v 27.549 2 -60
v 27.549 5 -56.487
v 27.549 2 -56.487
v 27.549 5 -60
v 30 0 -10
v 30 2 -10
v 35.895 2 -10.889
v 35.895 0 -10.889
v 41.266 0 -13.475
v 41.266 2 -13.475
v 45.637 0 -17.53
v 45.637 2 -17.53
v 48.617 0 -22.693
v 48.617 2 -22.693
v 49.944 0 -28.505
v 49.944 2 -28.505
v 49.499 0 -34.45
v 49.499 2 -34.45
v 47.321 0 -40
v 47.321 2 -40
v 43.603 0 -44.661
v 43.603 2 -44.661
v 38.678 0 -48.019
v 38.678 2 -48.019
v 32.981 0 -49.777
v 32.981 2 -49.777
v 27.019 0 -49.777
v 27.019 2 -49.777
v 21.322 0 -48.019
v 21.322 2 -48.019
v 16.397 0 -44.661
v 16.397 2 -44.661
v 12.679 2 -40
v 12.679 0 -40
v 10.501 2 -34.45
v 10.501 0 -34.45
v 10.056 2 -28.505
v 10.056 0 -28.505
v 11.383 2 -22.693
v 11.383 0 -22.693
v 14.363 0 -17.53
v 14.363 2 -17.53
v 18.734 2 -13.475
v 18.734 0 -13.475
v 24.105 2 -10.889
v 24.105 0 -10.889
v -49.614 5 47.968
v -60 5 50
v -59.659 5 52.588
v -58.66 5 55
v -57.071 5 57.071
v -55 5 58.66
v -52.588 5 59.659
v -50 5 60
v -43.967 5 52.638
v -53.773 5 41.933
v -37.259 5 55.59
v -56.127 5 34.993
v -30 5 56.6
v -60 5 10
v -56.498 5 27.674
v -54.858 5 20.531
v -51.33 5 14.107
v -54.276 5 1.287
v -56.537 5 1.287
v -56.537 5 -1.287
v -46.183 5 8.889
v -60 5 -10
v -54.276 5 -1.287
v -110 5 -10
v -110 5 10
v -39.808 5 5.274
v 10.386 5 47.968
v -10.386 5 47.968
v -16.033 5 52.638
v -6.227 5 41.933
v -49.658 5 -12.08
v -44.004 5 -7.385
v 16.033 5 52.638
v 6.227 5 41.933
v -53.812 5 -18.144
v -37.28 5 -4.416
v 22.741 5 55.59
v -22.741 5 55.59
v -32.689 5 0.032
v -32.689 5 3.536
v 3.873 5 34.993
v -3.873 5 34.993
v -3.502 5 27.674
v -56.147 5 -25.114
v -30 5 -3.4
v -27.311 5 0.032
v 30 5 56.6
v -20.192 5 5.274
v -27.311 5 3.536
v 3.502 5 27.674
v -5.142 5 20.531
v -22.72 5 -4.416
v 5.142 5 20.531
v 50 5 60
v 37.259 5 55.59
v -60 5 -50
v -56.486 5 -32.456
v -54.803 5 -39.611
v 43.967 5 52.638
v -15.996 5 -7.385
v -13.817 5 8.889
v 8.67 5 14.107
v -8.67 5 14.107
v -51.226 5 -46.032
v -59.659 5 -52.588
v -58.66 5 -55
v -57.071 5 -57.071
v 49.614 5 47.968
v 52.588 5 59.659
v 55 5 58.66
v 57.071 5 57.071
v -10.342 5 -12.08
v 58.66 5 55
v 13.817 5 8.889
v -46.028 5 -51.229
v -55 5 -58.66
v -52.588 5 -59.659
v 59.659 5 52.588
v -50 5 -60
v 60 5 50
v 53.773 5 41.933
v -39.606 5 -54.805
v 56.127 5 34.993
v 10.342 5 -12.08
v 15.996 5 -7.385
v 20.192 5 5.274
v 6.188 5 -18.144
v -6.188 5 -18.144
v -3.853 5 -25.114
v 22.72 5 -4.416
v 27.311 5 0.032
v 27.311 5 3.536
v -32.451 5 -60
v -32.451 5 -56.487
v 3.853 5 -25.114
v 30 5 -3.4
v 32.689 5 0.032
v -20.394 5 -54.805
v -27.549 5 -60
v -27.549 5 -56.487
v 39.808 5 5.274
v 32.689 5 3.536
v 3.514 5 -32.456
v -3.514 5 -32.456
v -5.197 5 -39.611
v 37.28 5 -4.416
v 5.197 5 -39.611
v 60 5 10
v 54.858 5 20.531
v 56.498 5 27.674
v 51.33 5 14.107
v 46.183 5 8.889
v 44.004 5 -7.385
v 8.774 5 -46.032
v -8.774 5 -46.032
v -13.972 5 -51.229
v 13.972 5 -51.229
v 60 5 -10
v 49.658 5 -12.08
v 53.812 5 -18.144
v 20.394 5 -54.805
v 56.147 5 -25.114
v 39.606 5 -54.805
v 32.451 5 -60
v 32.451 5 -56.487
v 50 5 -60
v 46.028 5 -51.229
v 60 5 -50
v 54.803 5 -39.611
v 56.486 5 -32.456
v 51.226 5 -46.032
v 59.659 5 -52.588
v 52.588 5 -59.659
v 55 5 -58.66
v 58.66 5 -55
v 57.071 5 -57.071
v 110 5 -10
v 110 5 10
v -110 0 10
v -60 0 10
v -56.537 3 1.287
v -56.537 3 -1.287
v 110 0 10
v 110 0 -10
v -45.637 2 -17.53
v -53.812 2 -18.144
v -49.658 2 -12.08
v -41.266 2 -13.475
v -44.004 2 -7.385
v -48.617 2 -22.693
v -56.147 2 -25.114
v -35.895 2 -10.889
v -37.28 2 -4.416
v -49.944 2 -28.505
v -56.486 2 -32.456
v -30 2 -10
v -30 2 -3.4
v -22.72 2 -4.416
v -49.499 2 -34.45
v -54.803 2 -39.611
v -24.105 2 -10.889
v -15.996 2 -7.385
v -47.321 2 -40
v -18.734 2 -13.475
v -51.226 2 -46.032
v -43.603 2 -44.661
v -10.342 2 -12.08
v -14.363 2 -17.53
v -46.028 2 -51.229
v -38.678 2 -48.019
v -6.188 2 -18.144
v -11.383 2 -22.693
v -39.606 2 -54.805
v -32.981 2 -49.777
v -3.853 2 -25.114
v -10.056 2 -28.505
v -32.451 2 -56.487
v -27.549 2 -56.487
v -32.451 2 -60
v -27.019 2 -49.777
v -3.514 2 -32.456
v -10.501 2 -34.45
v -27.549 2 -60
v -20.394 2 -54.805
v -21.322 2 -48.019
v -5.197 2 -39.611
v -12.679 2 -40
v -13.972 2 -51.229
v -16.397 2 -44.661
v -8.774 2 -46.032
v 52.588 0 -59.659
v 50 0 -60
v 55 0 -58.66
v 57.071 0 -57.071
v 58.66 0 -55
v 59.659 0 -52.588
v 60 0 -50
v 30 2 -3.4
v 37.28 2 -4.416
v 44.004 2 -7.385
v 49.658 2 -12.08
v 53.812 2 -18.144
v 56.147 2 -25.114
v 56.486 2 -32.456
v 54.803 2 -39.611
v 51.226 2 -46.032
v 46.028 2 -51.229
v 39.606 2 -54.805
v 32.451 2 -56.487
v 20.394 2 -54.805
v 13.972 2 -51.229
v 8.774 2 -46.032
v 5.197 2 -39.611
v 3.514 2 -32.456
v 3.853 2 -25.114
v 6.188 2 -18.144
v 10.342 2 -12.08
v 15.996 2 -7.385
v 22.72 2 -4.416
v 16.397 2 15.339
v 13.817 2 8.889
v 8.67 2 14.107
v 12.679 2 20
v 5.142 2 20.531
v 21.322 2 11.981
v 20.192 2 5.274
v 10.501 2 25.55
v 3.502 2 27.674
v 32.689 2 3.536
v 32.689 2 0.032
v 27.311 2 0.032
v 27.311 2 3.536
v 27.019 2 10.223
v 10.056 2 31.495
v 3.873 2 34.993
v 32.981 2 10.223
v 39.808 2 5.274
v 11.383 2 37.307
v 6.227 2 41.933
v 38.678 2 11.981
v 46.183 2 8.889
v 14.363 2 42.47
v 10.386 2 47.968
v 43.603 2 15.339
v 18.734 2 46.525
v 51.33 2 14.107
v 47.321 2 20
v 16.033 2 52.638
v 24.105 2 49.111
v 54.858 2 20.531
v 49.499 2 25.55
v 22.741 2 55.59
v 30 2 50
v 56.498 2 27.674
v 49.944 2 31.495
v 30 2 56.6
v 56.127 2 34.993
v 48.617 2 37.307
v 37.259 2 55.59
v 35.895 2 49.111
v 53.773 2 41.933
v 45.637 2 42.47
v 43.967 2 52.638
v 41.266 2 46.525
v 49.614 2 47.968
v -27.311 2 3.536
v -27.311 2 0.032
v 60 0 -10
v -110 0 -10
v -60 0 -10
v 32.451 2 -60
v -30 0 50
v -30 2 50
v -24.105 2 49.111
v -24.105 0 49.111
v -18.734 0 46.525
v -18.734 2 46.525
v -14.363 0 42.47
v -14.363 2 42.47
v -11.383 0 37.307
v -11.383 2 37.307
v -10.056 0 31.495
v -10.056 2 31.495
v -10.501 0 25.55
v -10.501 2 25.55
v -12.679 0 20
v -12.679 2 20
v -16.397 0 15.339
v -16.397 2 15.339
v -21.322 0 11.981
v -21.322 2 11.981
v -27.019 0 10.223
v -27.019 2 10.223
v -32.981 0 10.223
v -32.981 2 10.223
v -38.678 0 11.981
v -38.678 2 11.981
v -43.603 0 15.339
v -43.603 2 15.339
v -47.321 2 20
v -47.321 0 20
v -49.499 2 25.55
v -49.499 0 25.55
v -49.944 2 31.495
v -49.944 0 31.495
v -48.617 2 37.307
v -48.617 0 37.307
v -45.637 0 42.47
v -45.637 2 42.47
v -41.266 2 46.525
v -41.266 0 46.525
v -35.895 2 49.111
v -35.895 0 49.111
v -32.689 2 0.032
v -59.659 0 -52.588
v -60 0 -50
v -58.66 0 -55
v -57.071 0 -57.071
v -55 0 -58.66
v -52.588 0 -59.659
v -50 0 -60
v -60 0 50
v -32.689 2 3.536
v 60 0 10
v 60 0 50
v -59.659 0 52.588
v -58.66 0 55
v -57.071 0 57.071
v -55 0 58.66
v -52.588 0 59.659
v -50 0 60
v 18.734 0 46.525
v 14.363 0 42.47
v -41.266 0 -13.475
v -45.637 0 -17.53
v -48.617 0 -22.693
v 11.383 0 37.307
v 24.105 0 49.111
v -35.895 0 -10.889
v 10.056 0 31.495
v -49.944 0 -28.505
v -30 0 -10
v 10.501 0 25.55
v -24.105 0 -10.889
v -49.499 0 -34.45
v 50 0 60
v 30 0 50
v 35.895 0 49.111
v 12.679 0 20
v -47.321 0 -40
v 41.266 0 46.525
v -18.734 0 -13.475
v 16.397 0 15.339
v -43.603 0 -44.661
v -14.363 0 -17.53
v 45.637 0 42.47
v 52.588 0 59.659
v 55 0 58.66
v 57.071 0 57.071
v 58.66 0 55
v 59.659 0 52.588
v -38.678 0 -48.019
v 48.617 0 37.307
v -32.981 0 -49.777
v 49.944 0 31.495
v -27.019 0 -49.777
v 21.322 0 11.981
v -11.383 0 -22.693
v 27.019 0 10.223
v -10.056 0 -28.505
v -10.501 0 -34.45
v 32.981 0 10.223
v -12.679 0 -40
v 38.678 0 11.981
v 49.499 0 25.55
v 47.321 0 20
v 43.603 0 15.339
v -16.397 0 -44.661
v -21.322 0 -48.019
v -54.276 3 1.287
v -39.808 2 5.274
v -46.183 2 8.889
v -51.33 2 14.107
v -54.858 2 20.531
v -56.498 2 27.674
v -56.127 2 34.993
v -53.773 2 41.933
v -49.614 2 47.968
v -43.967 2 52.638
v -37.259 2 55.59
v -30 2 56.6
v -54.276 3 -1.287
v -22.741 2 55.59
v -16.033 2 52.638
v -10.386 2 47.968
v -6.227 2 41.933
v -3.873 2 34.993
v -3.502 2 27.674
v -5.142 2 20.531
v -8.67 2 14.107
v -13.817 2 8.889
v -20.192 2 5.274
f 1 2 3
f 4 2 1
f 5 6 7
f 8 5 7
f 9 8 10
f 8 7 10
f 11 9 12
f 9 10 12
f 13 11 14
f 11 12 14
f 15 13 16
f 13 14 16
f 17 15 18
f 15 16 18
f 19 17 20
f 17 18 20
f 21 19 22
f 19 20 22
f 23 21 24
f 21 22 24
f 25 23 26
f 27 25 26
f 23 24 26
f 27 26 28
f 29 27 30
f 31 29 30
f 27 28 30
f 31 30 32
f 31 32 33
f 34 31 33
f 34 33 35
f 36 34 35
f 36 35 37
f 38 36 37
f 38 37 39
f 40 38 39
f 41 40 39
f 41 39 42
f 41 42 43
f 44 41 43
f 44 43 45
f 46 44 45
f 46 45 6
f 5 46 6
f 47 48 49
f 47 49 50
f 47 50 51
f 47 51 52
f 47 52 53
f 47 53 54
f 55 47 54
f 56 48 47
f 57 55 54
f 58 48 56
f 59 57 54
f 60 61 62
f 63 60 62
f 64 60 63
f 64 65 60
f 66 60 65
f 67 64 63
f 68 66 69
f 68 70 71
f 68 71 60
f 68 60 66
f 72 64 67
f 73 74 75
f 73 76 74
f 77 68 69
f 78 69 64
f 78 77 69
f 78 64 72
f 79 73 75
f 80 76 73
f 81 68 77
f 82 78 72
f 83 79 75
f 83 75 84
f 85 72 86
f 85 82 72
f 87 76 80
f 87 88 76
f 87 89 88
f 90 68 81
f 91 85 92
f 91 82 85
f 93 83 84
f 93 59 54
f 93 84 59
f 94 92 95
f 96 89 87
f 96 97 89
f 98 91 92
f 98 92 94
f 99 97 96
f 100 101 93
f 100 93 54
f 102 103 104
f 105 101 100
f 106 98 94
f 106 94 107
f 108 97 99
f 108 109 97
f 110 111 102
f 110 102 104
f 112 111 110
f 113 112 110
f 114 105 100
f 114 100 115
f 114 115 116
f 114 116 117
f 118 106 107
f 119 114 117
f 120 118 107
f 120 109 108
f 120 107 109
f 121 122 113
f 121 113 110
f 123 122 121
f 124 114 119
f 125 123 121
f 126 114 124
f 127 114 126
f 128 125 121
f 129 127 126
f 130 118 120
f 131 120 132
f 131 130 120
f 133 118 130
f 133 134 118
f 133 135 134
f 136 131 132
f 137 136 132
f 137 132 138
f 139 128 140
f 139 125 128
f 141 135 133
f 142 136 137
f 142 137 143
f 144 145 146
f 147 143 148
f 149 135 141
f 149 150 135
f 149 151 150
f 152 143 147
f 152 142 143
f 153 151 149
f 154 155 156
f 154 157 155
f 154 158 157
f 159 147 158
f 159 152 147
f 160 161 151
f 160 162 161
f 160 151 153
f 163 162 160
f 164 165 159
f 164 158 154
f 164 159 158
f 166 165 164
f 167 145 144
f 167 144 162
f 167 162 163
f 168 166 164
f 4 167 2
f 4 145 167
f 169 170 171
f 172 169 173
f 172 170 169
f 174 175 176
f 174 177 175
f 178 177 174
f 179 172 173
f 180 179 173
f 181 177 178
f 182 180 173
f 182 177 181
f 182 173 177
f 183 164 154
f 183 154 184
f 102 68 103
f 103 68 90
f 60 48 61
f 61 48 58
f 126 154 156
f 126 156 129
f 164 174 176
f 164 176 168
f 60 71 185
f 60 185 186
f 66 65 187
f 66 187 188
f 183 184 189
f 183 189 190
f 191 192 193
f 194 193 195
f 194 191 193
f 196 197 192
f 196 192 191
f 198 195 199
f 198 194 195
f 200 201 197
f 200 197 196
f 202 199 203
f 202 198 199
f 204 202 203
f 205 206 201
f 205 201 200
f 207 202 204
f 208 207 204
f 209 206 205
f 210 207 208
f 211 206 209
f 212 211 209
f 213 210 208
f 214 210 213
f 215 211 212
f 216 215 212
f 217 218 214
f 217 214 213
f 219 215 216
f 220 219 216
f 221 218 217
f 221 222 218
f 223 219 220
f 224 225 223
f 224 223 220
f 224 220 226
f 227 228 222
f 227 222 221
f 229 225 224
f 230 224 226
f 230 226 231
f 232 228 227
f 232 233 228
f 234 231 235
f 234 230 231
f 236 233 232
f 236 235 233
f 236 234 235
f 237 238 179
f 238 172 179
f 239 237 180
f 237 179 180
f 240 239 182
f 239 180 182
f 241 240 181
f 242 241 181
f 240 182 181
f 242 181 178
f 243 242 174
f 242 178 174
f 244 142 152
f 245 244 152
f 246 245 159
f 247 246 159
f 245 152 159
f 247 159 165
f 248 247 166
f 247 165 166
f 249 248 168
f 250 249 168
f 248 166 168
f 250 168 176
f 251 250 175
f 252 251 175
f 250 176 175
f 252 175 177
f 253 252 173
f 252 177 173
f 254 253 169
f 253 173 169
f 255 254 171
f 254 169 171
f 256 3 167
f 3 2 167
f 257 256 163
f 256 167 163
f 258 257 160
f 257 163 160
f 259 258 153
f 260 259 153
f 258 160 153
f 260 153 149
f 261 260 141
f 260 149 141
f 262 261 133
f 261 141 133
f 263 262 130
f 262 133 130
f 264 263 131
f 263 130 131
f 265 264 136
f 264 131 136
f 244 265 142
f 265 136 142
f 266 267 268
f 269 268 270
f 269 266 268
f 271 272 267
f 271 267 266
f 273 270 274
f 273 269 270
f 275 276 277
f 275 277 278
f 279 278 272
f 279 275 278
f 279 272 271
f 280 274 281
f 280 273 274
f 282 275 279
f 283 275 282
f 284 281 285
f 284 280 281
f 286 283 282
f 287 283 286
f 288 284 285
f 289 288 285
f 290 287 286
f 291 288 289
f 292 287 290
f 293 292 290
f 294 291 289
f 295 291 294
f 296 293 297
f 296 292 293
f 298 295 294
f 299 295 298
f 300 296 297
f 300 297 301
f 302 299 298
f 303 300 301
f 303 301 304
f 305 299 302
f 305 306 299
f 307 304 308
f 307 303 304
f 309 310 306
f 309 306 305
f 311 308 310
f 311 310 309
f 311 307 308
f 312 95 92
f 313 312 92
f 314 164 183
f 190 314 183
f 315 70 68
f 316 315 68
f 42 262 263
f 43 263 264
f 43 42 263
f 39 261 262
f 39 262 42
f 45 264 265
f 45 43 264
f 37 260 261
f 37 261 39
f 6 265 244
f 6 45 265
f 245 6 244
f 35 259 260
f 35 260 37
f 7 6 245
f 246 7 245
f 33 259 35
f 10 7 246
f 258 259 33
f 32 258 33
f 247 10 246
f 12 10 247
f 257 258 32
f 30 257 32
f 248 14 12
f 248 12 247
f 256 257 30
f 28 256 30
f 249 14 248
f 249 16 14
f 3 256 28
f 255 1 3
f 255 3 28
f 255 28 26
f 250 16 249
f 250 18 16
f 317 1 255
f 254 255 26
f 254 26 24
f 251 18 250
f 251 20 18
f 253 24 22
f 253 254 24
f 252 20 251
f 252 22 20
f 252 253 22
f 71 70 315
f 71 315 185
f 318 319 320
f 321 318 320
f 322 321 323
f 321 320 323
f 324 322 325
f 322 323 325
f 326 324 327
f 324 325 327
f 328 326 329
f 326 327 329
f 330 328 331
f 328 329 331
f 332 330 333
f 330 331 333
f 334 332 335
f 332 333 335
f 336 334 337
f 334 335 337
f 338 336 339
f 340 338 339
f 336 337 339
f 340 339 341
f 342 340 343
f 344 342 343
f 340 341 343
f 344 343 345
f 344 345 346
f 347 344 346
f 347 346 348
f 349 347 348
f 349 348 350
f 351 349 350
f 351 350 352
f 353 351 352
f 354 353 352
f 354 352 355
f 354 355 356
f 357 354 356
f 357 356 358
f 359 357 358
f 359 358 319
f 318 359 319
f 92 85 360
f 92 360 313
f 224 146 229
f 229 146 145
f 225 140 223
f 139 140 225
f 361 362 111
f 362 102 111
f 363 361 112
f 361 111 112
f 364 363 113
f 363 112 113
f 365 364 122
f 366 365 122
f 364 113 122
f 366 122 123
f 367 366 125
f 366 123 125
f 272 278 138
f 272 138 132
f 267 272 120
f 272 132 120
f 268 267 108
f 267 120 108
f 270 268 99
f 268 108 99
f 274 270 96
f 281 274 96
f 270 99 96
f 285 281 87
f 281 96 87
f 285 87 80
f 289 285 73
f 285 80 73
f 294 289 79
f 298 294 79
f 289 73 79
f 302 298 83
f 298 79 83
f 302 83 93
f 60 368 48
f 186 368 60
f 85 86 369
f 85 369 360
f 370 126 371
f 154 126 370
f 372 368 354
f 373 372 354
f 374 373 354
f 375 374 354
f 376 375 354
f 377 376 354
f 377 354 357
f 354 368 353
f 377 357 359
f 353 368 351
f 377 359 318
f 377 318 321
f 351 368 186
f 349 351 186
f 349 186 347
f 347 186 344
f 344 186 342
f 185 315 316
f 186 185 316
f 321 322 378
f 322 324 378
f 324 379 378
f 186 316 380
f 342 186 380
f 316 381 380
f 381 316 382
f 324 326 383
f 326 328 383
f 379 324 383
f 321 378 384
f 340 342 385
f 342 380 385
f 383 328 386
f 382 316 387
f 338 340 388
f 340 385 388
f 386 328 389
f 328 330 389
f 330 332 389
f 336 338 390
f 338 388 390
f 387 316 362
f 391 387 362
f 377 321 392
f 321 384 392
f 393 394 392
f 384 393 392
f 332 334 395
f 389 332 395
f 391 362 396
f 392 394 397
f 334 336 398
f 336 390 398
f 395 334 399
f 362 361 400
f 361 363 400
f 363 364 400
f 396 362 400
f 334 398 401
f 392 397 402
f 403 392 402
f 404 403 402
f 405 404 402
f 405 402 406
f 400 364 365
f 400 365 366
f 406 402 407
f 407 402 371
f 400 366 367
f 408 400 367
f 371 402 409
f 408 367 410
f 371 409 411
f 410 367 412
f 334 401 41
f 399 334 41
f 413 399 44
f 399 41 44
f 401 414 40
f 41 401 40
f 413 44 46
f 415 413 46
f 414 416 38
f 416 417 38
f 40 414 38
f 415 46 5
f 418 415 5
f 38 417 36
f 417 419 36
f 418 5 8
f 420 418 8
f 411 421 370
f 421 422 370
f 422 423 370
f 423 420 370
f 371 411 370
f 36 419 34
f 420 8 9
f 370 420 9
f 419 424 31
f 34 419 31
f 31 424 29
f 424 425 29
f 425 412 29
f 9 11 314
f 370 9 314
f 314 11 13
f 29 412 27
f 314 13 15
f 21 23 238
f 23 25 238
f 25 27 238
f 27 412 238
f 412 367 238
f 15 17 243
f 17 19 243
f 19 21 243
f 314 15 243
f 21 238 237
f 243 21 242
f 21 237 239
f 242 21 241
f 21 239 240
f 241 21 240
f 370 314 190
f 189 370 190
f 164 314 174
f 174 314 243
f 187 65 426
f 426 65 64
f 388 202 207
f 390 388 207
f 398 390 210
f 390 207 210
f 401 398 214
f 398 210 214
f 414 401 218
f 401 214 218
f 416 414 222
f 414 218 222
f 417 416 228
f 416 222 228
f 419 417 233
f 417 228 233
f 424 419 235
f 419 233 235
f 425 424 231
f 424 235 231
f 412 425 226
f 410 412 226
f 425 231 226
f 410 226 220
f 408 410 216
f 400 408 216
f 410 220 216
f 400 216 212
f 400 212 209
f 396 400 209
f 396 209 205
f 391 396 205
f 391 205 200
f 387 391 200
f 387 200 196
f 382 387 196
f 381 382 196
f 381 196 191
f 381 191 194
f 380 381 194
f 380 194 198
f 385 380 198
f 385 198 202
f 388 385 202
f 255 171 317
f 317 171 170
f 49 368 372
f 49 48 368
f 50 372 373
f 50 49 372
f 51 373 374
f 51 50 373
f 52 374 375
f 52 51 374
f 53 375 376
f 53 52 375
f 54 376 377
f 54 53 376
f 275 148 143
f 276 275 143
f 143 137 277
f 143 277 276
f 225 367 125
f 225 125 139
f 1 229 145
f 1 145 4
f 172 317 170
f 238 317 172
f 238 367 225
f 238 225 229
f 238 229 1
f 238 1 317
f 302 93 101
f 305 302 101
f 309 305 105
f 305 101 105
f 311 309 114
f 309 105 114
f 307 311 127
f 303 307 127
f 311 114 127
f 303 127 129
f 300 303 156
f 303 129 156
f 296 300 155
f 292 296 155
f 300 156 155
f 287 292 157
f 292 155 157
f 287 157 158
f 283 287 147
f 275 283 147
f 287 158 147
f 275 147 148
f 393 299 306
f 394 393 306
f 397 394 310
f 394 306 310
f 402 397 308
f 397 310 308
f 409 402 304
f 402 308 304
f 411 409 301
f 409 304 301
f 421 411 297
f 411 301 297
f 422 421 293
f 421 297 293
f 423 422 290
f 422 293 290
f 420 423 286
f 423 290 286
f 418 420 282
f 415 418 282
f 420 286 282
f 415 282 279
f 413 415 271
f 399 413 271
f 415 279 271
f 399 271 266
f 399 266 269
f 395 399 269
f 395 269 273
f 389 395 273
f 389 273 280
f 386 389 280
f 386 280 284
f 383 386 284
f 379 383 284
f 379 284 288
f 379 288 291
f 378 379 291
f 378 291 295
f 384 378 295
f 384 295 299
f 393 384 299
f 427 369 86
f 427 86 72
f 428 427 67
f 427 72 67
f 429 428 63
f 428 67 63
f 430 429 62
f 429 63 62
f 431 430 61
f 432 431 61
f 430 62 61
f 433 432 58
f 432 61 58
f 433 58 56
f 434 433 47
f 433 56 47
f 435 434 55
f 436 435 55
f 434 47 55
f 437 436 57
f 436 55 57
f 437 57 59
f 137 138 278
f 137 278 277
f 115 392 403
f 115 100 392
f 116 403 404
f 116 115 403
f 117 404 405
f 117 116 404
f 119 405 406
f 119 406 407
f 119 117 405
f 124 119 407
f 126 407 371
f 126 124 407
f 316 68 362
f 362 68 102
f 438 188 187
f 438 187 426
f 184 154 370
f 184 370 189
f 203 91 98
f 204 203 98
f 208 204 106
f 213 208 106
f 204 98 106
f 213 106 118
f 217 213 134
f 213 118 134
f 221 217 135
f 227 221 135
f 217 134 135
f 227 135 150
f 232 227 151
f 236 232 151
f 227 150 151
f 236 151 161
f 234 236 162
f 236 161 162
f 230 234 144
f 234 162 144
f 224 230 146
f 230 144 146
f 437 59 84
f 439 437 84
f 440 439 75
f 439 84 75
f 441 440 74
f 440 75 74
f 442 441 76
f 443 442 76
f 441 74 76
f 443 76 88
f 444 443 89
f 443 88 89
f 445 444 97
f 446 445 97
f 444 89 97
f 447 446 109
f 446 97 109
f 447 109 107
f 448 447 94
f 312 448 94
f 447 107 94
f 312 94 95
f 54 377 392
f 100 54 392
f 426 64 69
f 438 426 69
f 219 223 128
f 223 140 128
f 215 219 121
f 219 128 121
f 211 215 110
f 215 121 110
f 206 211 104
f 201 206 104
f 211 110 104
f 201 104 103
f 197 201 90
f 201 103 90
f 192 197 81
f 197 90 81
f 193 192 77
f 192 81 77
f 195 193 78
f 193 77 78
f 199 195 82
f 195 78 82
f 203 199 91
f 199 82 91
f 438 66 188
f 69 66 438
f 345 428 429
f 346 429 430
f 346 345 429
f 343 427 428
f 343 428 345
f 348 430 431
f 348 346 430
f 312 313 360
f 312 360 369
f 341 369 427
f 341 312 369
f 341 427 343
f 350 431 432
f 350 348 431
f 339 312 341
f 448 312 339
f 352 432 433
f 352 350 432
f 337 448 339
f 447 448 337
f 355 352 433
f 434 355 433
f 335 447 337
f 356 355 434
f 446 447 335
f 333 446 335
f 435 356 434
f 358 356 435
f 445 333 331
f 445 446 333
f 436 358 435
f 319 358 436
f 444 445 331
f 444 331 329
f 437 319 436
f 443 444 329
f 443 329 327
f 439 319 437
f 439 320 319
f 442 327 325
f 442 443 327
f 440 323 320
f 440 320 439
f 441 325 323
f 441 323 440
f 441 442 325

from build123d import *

# Parameters (mm, degrees)
SKETCH1_W           = 120
SKETCH1_H           = 120
BOSS_EXTRUDE1_DEPTH = 5
SKETCH2_R           = 20
CUT_EXTRUDE4_DEPTH  = 5
SKETCH3_R           = 26.6
SKETCH3_R_2         = 20
CUT_EXTRUDE5_DEPTH  = 3
SKETCH4_W           = 60
SKETCH4_H           = 5
BOSS_EXTRUDE2_DEPTH = 50
SKETCH5_W           = 60
SKETCH5_H           = 5
BOSS_EXTRUDE3_DEPTH = 50
FILLET3_R           = 10
FILLET4_R           = 10
FILLET5_R           = 10
FILLET6_R           = 10
SKETCH8_W           = 50
SKETCH8_H           = 20
CUT_EXTRUDE6_DEPTH  = 10
SKETCH10_W          = 2.261137553
SKETCH10_H          = 2.574285836
CUT_EXTRUDE7_DEPTH  = 2
SKETCH12_W          = 5.377639696
SKETCH12_H          = 6.736845814
CUT_EXTRUDE10_DEPTH = 3
SKETCH14_W          = 4.90266265
SKETCH14_H          = 7.042630192
CUT_EXTRUDE11_DEPTH = 3


with BuildPart() as part:
    # Sketch1 → Boss-Extrude1 (new body)
    with BuildSketch(Plane(origin=(0, 0, 0), x_dir=(1, 0, 0), z_dir=(0, 1, 0))):
        Rectangle(SKETCH1_W, SKETCH1_H)
    extrude(amount=BOSS_EXTRUDE1_DEPTH)

    # Sketch2 → Cut-Extrude4 (cut)
    with BuildSketch(Plane(origin=(0, 5, 0), x_dir=(1, 0, 0), z_dir=(0, 1, 0))):
        with Locations(Location((30, 30, 0), (0, 0, 270))):
            Circle(SKETCH2_R)
        with Locations(Location((-30, -30, 0), (0, 0, 270))):
            Circle(SKETCH2_R)
        with Locations(Location((30, -30, 0), (0, 0, 270))):
            Circle(SKETCH2_R)
        with Locations(Location((-30, 30, 0), (0, 0, 270))):
            Circle(SKETCH2_R)
    extrude(amount=-CUT_EXTRUDE4_DEPTH, mode=Mode.SUBTRACT)

    # Sketch3 → Cut-Extrude5 (cut)
    # profile 1 of 4: a face of its own
    with BuildSketch(Plane(origin=(0, 5, 0), x_dir=(1, 0, 0), z_dir=(0, 1, 0))):
        with Locations(Location((30, 30, 0), (0, 0, 270))):
            Circle(SKETCH3_R)
        with Locations(Location((30, 30, 0), (0, 0, 270))):
            Circle(SKETCH3_R_2, mode=Mode.SUBTRACT)
    # profile 2 of 4: a face of its own
    with BuildSketch(Plane(origin=(0, 5, 0), x_dir=(1, 0, 0), z_dir=(0, 1, 0))):
        with Locations(Location((-30, -30, 0), (0, 0, 270))):
            Circle(SKETCH3_R)
        with Locations(Location((-30, -30, 0), (0, 0, 270))):
            Circle(SKETCH3_R_2, mode=Mode.SUBTRACT)
    # profile 3 of 4: a face of its own
    with BuildSketch(Plane(origin=(0, 5, 0), x_dir=(1, 0, 0), z_dir=(0, 1, 0))):
        with Locations(Location((30, -30, 0), (0, 0, 270))):
            Circle(SKETCH3_R)
        with Locations(Location((30, -30, 0), (0, 0, 270))):
            Circle(SKETCH3_R_2, mode=Mode.SUBTRACT)
    # profile 4 of 4: a face of its own
    with BuildSketch(Plane(origin=(0, 5, 0), x_dir=(1, 0, 0), z_dir=(0, 1, 0))):
        with Locations(Location((-30, 30, 0), (0, 0, 270))):
            Circle(SKETCH3_R)
    extrude(amount=-CUT_EXTRUDE5_DEPTH, mode=Mode.SUBTRACT)

    # Sketch4 → Boss-Extrude2 (add)
    with BuildSketch(Plane(origin=(60, 0, 0), x_dir=(0, 0, -1), z_dir=(1, 0, 0))):
        with Locations((0, 2.5)):
            Rectangle(SKETCH4_W, SKETCH4_H)
    extrude(amount=BOSS_EXTRUDE2_DEPTH)

    # Sketch5 → Boss-Extrude3 (add)
    with BuildSketch(Plane.ZY.offset(60)):
        with Locations((0, 2.5)):
            Rectangle(SKETCH5_W, SKETCH5_H)
    extrude(amount=BOSS_EXTRUDE3_DEPTH)

    # Fillet3
    fillet3_edges = [part.edges().sort_by_distance(p)[0] for p in [
        (-60, 2.5, 60),
    ]]
    fillet(fillet3_edges, radius=FILLET3_R)

    # Fillet4
    fillet4_edges = [part.edges().sort_by_distance(p)[0] for p in [
        (60, 2.5, 60),
    ]]
    fillet(fillet4_edges, radius=FILLET4_R)

    # Fillet5
    fillet5_edges = [part.edges().sort_by_distance(p)[0] for p in [
        (-60, 2.5, -60),
    ]]
    fillet(fillet5_edges, radius=FILLET5_R)

    # Fillet6
    fillet6_edges = [part.edges().sort_by_distance(p)[0] for p in [
        (60, 2.5, -60),
    ]]
    fillet(fillet6_edges, radius=FILLET6_R)

    # Sketch8 → Cut-Extrude6 (cut)
    with BuildSketch(Plane(origin=(0, 5, 0), x_dir=(1, 0, 0), z_dir=(0, 1, 0))):
        with Locations((-85, 20)):
            Rectangle(SKETCH8_W, SKETCH8_H)
        with Locations((-85, -20)):
            Rectangle(SKETCH8_W, SKETCH8_H)
        with Locations((85, -20)):
            Rectangle(SKETCH8_W, SKETCH8_H)
        with Locations((85, 20)):
            Rectangle(SKETCH8_W, SKETCH8_H)
    extrude(amount=-CUT_EXTRUDE6_DEPTH, mode=Mode.SUBTRACT)

    # Sketch10 → Cut-Extrude7 (cut)
    with BuildSketch(Plane(origin=(0, 5, 0), x_dir=(1, 0, 0), z_dir=(0, 1, 0))):
        with Locations((-55.406362831, 0)):
            Rectangle(SKETCH10_W, SKETCH10_H)
    extrude(amount=-CUT_EXTRUDE7_DEPTH, mode=Mode.SUBTRACT)

    # Sketch12 → Cut-Extrude10 (cut)
    with BuildSketch(Plane(origin=(0, 5, 0), x_dir=(1, 0, 0), z_dir=(0, 1, 0))):
        with Locations((-30, -3.4)):
            Rectangle(SKETCH12_W, SKETCH12_H)
        with Locations((30, -3.4)):
            Rectangle(SKETCH12_W, SKETCH12_H)
    extrude(amount=-CUT_EXTRUDE10_DEPTH, mode=Mode.SUBTRACT)

    # Sketch14 → Cut-Extrude11 (cut)
    with BuildSketch(Plane(origin=(0, 5, 0), x_dir=(1, 0, 0), z_dir=(0, 1, 0))):
        with Locations((-30, 56.6)):
            Rectangle(SKETCH14_W, SKETCH14_H)
        with Locations((30, 56.6)):
            Rectangle(SKETCH14_W, SKETCH14_H)
    extrude(amount=-CUT_EXTRUDE11_DEPTH, mode=Mode.SUBTRACT)


solid = part.part
